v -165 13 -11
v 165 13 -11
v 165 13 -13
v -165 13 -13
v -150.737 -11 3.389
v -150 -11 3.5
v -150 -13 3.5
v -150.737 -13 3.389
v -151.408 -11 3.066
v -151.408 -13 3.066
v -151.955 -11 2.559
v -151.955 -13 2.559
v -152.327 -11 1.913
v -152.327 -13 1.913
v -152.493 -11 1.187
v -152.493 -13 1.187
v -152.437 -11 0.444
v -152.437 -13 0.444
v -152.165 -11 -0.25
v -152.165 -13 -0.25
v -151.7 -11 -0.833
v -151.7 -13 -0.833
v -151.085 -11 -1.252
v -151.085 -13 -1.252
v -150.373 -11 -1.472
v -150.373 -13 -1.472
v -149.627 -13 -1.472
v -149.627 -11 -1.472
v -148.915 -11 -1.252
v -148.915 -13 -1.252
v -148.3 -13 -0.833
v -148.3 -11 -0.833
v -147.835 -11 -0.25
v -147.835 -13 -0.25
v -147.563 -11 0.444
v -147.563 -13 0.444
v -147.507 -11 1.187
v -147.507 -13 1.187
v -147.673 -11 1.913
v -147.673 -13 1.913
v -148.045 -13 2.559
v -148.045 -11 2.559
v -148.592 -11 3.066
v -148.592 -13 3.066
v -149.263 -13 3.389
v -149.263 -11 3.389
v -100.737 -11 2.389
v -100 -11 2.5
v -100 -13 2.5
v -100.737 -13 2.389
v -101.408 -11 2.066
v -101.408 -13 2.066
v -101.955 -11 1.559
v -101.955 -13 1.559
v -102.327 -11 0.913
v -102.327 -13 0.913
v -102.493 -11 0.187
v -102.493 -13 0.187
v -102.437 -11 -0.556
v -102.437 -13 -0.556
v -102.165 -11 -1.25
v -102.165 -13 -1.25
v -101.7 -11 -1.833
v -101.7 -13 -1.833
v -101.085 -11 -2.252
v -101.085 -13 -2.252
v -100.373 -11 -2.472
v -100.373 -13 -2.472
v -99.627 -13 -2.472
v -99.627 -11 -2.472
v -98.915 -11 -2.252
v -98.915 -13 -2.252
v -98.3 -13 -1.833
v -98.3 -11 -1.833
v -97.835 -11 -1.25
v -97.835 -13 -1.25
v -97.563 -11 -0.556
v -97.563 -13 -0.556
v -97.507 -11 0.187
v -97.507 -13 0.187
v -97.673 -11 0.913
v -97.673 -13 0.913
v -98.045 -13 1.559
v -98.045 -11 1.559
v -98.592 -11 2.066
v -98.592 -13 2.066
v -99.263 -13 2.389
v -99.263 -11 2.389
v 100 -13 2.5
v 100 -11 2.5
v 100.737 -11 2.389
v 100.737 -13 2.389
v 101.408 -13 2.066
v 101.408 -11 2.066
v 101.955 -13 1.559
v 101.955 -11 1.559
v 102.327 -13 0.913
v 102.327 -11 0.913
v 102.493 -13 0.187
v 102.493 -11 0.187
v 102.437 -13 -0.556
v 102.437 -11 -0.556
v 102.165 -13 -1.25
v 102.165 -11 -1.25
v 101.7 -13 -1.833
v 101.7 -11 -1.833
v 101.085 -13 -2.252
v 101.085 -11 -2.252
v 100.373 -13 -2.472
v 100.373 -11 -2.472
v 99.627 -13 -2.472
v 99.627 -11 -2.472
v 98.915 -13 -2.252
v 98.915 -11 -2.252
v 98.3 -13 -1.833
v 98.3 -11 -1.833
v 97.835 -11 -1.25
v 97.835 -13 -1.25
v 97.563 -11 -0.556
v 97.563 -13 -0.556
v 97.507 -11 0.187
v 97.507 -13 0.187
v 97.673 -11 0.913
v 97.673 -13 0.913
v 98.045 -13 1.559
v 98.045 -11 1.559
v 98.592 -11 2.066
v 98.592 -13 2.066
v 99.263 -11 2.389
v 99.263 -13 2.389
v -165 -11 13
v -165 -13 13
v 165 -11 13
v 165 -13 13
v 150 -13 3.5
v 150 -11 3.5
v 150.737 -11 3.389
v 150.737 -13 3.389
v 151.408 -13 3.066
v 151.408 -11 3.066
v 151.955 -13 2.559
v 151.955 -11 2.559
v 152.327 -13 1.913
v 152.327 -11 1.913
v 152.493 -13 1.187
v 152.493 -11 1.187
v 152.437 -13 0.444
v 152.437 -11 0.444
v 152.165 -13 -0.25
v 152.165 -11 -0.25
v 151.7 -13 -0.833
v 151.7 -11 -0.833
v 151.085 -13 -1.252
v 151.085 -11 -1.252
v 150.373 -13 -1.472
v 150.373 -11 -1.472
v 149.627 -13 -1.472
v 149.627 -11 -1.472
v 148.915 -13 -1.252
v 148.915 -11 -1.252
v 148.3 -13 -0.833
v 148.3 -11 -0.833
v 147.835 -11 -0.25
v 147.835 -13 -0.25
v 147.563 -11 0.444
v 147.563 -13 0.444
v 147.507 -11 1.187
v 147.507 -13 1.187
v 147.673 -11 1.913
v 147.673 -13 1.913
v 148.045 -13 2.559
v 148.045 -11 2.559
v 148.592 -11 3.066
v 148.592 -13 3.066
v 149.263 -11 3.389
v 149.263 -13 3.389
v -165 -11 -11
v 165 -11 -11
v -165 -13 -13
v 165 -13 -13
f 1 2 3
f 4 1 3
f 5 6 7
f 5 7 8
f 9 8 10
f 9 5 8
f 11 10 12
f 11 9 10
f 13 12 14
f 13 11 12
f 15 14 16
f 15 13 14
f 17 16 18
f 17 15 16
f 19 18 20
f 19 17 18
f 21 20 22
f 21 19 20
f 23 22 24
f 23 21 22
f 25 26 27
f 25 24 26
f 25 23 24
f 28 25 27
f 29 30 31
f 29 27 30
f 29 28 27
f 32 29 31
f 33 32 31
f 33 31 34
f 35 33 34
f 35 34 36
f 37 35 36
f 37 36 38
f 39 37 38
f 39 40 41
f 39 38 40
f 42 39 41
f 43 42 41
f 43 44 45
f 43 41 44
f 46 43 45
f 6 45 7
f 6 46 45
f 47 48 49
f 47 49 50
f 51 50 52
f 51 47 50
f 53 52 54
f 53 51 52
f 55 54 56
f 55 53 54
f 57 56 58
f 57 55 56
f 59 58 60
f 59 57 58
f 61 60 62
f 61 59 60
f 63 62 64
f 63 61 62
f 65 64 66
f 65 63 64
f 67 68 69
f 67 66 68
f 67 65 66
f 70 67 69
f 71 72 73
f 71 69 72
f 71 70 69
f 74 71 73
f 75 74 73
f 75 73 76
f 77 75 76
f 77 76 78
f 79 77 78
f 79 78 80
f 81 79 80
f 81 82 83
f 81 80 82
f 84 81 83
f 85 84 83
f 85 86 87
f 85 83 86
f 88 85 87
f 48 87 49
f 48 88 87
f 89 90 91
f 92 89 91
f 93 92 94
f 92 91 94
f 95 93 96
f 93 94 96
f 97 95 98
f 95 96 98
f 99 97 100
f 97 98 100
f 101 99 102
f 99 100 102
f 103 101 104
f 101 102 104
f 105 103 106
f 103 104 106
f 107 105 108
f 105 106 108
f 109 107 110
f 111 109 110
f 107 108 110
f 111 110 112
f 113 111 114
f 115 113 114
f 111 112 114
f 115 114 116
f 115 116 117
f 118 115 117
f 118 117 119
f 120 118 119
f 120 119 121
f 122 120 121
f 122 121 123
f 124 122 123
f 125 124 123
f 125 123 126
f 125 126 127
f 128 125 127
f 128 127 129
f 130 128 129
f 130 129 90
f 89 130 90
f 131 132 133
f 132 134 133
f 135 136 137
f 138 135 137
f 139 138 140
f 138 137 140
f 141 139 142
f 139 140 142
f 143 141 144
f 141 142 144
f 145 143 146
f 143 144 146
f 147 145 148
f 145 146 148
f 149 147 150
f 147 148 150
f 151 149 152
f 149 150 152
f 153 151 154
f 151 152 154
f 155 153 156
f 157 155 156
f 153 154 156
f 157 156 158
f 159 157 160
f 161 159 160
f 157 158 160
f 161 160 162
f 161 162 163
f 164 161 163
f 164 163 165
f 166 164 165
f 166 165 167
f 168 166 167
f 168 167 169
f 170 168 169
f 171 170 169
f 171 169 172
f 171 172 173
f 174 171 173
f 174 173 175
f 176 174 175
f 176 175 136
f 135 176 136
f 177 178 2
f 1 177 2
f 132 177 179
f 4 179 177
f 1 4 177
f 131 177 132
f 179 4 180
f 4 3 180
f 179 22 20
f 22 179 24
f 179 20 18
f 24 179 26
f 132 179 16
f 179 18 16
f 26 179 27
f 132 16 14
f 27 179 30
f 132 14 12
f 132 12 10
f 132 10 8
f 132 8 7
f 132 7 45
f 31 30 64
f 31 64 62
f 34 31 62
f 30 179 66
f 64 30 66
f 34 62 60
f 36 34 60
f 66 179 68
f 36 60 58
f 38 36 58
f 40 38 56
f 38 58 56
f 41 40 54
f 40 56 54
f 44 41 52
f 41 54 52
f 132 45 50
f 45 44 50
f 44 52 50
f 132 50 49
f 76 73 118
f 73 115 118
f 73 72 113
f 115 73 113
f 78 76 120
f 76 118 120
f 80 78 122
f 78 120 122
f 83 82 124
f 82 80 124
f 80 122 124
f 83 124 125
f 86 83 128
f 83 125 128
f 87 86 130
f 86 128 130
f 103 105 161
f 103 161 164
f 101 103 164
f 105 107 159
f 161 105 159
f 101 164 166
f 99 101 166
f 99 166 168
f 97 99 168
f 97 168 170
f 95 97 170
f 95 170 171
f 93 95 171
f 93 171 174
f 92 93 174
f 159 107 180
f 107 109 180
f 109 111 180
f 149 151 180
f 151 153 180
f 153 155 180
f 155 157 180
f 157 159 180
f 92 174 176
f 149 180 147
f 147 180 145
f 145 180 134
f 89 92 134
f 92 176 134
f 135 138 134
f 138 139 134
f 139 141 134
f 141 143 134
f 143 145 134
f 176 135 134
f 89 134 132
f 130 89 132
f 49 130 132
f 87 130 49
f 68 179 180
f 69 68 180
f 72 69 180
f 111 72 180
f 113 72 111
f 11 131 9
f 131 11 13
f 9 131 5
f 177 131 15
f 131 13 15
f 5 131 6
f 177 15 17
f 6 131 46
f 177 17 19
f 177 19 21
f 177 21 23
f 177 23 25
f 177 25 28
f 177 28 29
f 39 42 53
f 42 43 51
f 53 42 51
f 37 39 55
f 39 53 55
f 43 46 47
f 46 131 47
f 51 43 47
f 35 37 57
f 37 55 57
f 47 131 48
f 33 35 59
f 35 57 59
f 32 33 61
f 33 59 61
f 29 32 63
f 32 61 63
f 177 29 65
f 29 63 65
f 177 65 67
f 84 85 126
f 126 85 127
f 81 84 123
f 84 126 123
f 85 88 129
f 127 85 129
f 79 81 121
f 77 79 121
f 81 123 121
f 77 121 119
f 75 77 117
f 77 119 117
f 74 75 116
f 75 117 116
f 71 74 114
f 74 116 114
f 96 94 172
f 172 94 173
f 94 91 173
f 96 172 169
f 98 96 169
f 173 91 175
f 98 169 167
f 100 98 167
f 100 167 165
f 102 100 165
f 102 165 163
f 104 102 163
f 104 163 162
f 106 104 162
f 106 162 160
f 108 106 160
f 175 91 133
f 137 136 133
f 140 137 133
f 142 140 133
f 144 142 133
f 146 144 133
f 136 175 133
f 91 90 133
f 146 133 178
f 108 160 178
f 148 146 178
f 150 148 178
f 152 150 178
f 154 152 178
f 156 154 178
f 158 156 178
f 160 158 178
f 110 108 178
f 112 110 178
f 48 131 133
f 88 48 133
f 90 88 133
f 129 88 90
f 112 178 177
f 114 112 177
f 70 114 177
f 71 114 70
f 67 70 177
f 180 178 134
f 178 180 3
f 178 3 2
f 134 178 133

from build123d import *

# Parameters (mm, degrees)
BOSS_EXTRUDE1_DEPTH = 165
SKETCH2_R           = 2.5
CUT_EXTRUDE1_DEPTH  = 167.021082999
SKETCH3_R           = 2.5
CUT_EXTRUDE2_DEPTH  = 167.021082999


with BuildPart() as part:
    # Sketch1 → Boss-Extrude1 (new, symmetric)
    with BuildSketch(Plane(origin=(0, 0, 0), x_dir=(0, 0, -1), z_dir=(1, 0, 0))):
        Polygon((11, 13), (13, 13), (13, -13), (-13, -13), (-13, -11), (11, -11), align=None)
    extrude(amount=BOSS_EXTRUDE1_DEPTH, both=True)

    # Sketch2 → Cut-Extrude1 (cut, through all)
    with BuildSketch(Plane(origin=(0, 0, 0), x_dir=(1, 0, 0), z_dir=(0, 1, 0))):
        with Locations(Location((150, -1, 0), (0, 0, 270))):
            Circle(SKETCH2_R)
    cut_extrude1 = extrude(amount=-CUT_EXTRUDE1_DEPTH, mode=Mode.SUBTRACT)

    # Mirror1: Cut-Extrude1 across plane
    add(cut_extrude1.mirror(Plane(origin=(0, 0, 0), x_dir=(0, 0, 1), z_dir=(1, 0, 0))), mode=Mode.SUBTRACT)

    # Sketch3 → Cut-Extrude2 (cut, through all)
    with BuildSketch(Plane(origin=(0, 0, 0), x_dir=(1, 0, 0), z_dir=(0, 1, 0))):
        with Locations(Location((100, 0, 0), (0, 0, 270))):
            Circle(SKETCH3_R)
    cut_extrude2 = extrude(amount=-CUT_EXTRUDE2_DEPTH, mode=Mode.SUBTRACT)

    # Mirror2: Cut-Extrude2 across plane
    add(cut_extrude2.mirror(Plane(origin=(0, 0, 0), x_dir=(0, 0, 1), z_dir=(1, 0, 0))), mode=Mode.SUBTRACT)


solid = part.part
